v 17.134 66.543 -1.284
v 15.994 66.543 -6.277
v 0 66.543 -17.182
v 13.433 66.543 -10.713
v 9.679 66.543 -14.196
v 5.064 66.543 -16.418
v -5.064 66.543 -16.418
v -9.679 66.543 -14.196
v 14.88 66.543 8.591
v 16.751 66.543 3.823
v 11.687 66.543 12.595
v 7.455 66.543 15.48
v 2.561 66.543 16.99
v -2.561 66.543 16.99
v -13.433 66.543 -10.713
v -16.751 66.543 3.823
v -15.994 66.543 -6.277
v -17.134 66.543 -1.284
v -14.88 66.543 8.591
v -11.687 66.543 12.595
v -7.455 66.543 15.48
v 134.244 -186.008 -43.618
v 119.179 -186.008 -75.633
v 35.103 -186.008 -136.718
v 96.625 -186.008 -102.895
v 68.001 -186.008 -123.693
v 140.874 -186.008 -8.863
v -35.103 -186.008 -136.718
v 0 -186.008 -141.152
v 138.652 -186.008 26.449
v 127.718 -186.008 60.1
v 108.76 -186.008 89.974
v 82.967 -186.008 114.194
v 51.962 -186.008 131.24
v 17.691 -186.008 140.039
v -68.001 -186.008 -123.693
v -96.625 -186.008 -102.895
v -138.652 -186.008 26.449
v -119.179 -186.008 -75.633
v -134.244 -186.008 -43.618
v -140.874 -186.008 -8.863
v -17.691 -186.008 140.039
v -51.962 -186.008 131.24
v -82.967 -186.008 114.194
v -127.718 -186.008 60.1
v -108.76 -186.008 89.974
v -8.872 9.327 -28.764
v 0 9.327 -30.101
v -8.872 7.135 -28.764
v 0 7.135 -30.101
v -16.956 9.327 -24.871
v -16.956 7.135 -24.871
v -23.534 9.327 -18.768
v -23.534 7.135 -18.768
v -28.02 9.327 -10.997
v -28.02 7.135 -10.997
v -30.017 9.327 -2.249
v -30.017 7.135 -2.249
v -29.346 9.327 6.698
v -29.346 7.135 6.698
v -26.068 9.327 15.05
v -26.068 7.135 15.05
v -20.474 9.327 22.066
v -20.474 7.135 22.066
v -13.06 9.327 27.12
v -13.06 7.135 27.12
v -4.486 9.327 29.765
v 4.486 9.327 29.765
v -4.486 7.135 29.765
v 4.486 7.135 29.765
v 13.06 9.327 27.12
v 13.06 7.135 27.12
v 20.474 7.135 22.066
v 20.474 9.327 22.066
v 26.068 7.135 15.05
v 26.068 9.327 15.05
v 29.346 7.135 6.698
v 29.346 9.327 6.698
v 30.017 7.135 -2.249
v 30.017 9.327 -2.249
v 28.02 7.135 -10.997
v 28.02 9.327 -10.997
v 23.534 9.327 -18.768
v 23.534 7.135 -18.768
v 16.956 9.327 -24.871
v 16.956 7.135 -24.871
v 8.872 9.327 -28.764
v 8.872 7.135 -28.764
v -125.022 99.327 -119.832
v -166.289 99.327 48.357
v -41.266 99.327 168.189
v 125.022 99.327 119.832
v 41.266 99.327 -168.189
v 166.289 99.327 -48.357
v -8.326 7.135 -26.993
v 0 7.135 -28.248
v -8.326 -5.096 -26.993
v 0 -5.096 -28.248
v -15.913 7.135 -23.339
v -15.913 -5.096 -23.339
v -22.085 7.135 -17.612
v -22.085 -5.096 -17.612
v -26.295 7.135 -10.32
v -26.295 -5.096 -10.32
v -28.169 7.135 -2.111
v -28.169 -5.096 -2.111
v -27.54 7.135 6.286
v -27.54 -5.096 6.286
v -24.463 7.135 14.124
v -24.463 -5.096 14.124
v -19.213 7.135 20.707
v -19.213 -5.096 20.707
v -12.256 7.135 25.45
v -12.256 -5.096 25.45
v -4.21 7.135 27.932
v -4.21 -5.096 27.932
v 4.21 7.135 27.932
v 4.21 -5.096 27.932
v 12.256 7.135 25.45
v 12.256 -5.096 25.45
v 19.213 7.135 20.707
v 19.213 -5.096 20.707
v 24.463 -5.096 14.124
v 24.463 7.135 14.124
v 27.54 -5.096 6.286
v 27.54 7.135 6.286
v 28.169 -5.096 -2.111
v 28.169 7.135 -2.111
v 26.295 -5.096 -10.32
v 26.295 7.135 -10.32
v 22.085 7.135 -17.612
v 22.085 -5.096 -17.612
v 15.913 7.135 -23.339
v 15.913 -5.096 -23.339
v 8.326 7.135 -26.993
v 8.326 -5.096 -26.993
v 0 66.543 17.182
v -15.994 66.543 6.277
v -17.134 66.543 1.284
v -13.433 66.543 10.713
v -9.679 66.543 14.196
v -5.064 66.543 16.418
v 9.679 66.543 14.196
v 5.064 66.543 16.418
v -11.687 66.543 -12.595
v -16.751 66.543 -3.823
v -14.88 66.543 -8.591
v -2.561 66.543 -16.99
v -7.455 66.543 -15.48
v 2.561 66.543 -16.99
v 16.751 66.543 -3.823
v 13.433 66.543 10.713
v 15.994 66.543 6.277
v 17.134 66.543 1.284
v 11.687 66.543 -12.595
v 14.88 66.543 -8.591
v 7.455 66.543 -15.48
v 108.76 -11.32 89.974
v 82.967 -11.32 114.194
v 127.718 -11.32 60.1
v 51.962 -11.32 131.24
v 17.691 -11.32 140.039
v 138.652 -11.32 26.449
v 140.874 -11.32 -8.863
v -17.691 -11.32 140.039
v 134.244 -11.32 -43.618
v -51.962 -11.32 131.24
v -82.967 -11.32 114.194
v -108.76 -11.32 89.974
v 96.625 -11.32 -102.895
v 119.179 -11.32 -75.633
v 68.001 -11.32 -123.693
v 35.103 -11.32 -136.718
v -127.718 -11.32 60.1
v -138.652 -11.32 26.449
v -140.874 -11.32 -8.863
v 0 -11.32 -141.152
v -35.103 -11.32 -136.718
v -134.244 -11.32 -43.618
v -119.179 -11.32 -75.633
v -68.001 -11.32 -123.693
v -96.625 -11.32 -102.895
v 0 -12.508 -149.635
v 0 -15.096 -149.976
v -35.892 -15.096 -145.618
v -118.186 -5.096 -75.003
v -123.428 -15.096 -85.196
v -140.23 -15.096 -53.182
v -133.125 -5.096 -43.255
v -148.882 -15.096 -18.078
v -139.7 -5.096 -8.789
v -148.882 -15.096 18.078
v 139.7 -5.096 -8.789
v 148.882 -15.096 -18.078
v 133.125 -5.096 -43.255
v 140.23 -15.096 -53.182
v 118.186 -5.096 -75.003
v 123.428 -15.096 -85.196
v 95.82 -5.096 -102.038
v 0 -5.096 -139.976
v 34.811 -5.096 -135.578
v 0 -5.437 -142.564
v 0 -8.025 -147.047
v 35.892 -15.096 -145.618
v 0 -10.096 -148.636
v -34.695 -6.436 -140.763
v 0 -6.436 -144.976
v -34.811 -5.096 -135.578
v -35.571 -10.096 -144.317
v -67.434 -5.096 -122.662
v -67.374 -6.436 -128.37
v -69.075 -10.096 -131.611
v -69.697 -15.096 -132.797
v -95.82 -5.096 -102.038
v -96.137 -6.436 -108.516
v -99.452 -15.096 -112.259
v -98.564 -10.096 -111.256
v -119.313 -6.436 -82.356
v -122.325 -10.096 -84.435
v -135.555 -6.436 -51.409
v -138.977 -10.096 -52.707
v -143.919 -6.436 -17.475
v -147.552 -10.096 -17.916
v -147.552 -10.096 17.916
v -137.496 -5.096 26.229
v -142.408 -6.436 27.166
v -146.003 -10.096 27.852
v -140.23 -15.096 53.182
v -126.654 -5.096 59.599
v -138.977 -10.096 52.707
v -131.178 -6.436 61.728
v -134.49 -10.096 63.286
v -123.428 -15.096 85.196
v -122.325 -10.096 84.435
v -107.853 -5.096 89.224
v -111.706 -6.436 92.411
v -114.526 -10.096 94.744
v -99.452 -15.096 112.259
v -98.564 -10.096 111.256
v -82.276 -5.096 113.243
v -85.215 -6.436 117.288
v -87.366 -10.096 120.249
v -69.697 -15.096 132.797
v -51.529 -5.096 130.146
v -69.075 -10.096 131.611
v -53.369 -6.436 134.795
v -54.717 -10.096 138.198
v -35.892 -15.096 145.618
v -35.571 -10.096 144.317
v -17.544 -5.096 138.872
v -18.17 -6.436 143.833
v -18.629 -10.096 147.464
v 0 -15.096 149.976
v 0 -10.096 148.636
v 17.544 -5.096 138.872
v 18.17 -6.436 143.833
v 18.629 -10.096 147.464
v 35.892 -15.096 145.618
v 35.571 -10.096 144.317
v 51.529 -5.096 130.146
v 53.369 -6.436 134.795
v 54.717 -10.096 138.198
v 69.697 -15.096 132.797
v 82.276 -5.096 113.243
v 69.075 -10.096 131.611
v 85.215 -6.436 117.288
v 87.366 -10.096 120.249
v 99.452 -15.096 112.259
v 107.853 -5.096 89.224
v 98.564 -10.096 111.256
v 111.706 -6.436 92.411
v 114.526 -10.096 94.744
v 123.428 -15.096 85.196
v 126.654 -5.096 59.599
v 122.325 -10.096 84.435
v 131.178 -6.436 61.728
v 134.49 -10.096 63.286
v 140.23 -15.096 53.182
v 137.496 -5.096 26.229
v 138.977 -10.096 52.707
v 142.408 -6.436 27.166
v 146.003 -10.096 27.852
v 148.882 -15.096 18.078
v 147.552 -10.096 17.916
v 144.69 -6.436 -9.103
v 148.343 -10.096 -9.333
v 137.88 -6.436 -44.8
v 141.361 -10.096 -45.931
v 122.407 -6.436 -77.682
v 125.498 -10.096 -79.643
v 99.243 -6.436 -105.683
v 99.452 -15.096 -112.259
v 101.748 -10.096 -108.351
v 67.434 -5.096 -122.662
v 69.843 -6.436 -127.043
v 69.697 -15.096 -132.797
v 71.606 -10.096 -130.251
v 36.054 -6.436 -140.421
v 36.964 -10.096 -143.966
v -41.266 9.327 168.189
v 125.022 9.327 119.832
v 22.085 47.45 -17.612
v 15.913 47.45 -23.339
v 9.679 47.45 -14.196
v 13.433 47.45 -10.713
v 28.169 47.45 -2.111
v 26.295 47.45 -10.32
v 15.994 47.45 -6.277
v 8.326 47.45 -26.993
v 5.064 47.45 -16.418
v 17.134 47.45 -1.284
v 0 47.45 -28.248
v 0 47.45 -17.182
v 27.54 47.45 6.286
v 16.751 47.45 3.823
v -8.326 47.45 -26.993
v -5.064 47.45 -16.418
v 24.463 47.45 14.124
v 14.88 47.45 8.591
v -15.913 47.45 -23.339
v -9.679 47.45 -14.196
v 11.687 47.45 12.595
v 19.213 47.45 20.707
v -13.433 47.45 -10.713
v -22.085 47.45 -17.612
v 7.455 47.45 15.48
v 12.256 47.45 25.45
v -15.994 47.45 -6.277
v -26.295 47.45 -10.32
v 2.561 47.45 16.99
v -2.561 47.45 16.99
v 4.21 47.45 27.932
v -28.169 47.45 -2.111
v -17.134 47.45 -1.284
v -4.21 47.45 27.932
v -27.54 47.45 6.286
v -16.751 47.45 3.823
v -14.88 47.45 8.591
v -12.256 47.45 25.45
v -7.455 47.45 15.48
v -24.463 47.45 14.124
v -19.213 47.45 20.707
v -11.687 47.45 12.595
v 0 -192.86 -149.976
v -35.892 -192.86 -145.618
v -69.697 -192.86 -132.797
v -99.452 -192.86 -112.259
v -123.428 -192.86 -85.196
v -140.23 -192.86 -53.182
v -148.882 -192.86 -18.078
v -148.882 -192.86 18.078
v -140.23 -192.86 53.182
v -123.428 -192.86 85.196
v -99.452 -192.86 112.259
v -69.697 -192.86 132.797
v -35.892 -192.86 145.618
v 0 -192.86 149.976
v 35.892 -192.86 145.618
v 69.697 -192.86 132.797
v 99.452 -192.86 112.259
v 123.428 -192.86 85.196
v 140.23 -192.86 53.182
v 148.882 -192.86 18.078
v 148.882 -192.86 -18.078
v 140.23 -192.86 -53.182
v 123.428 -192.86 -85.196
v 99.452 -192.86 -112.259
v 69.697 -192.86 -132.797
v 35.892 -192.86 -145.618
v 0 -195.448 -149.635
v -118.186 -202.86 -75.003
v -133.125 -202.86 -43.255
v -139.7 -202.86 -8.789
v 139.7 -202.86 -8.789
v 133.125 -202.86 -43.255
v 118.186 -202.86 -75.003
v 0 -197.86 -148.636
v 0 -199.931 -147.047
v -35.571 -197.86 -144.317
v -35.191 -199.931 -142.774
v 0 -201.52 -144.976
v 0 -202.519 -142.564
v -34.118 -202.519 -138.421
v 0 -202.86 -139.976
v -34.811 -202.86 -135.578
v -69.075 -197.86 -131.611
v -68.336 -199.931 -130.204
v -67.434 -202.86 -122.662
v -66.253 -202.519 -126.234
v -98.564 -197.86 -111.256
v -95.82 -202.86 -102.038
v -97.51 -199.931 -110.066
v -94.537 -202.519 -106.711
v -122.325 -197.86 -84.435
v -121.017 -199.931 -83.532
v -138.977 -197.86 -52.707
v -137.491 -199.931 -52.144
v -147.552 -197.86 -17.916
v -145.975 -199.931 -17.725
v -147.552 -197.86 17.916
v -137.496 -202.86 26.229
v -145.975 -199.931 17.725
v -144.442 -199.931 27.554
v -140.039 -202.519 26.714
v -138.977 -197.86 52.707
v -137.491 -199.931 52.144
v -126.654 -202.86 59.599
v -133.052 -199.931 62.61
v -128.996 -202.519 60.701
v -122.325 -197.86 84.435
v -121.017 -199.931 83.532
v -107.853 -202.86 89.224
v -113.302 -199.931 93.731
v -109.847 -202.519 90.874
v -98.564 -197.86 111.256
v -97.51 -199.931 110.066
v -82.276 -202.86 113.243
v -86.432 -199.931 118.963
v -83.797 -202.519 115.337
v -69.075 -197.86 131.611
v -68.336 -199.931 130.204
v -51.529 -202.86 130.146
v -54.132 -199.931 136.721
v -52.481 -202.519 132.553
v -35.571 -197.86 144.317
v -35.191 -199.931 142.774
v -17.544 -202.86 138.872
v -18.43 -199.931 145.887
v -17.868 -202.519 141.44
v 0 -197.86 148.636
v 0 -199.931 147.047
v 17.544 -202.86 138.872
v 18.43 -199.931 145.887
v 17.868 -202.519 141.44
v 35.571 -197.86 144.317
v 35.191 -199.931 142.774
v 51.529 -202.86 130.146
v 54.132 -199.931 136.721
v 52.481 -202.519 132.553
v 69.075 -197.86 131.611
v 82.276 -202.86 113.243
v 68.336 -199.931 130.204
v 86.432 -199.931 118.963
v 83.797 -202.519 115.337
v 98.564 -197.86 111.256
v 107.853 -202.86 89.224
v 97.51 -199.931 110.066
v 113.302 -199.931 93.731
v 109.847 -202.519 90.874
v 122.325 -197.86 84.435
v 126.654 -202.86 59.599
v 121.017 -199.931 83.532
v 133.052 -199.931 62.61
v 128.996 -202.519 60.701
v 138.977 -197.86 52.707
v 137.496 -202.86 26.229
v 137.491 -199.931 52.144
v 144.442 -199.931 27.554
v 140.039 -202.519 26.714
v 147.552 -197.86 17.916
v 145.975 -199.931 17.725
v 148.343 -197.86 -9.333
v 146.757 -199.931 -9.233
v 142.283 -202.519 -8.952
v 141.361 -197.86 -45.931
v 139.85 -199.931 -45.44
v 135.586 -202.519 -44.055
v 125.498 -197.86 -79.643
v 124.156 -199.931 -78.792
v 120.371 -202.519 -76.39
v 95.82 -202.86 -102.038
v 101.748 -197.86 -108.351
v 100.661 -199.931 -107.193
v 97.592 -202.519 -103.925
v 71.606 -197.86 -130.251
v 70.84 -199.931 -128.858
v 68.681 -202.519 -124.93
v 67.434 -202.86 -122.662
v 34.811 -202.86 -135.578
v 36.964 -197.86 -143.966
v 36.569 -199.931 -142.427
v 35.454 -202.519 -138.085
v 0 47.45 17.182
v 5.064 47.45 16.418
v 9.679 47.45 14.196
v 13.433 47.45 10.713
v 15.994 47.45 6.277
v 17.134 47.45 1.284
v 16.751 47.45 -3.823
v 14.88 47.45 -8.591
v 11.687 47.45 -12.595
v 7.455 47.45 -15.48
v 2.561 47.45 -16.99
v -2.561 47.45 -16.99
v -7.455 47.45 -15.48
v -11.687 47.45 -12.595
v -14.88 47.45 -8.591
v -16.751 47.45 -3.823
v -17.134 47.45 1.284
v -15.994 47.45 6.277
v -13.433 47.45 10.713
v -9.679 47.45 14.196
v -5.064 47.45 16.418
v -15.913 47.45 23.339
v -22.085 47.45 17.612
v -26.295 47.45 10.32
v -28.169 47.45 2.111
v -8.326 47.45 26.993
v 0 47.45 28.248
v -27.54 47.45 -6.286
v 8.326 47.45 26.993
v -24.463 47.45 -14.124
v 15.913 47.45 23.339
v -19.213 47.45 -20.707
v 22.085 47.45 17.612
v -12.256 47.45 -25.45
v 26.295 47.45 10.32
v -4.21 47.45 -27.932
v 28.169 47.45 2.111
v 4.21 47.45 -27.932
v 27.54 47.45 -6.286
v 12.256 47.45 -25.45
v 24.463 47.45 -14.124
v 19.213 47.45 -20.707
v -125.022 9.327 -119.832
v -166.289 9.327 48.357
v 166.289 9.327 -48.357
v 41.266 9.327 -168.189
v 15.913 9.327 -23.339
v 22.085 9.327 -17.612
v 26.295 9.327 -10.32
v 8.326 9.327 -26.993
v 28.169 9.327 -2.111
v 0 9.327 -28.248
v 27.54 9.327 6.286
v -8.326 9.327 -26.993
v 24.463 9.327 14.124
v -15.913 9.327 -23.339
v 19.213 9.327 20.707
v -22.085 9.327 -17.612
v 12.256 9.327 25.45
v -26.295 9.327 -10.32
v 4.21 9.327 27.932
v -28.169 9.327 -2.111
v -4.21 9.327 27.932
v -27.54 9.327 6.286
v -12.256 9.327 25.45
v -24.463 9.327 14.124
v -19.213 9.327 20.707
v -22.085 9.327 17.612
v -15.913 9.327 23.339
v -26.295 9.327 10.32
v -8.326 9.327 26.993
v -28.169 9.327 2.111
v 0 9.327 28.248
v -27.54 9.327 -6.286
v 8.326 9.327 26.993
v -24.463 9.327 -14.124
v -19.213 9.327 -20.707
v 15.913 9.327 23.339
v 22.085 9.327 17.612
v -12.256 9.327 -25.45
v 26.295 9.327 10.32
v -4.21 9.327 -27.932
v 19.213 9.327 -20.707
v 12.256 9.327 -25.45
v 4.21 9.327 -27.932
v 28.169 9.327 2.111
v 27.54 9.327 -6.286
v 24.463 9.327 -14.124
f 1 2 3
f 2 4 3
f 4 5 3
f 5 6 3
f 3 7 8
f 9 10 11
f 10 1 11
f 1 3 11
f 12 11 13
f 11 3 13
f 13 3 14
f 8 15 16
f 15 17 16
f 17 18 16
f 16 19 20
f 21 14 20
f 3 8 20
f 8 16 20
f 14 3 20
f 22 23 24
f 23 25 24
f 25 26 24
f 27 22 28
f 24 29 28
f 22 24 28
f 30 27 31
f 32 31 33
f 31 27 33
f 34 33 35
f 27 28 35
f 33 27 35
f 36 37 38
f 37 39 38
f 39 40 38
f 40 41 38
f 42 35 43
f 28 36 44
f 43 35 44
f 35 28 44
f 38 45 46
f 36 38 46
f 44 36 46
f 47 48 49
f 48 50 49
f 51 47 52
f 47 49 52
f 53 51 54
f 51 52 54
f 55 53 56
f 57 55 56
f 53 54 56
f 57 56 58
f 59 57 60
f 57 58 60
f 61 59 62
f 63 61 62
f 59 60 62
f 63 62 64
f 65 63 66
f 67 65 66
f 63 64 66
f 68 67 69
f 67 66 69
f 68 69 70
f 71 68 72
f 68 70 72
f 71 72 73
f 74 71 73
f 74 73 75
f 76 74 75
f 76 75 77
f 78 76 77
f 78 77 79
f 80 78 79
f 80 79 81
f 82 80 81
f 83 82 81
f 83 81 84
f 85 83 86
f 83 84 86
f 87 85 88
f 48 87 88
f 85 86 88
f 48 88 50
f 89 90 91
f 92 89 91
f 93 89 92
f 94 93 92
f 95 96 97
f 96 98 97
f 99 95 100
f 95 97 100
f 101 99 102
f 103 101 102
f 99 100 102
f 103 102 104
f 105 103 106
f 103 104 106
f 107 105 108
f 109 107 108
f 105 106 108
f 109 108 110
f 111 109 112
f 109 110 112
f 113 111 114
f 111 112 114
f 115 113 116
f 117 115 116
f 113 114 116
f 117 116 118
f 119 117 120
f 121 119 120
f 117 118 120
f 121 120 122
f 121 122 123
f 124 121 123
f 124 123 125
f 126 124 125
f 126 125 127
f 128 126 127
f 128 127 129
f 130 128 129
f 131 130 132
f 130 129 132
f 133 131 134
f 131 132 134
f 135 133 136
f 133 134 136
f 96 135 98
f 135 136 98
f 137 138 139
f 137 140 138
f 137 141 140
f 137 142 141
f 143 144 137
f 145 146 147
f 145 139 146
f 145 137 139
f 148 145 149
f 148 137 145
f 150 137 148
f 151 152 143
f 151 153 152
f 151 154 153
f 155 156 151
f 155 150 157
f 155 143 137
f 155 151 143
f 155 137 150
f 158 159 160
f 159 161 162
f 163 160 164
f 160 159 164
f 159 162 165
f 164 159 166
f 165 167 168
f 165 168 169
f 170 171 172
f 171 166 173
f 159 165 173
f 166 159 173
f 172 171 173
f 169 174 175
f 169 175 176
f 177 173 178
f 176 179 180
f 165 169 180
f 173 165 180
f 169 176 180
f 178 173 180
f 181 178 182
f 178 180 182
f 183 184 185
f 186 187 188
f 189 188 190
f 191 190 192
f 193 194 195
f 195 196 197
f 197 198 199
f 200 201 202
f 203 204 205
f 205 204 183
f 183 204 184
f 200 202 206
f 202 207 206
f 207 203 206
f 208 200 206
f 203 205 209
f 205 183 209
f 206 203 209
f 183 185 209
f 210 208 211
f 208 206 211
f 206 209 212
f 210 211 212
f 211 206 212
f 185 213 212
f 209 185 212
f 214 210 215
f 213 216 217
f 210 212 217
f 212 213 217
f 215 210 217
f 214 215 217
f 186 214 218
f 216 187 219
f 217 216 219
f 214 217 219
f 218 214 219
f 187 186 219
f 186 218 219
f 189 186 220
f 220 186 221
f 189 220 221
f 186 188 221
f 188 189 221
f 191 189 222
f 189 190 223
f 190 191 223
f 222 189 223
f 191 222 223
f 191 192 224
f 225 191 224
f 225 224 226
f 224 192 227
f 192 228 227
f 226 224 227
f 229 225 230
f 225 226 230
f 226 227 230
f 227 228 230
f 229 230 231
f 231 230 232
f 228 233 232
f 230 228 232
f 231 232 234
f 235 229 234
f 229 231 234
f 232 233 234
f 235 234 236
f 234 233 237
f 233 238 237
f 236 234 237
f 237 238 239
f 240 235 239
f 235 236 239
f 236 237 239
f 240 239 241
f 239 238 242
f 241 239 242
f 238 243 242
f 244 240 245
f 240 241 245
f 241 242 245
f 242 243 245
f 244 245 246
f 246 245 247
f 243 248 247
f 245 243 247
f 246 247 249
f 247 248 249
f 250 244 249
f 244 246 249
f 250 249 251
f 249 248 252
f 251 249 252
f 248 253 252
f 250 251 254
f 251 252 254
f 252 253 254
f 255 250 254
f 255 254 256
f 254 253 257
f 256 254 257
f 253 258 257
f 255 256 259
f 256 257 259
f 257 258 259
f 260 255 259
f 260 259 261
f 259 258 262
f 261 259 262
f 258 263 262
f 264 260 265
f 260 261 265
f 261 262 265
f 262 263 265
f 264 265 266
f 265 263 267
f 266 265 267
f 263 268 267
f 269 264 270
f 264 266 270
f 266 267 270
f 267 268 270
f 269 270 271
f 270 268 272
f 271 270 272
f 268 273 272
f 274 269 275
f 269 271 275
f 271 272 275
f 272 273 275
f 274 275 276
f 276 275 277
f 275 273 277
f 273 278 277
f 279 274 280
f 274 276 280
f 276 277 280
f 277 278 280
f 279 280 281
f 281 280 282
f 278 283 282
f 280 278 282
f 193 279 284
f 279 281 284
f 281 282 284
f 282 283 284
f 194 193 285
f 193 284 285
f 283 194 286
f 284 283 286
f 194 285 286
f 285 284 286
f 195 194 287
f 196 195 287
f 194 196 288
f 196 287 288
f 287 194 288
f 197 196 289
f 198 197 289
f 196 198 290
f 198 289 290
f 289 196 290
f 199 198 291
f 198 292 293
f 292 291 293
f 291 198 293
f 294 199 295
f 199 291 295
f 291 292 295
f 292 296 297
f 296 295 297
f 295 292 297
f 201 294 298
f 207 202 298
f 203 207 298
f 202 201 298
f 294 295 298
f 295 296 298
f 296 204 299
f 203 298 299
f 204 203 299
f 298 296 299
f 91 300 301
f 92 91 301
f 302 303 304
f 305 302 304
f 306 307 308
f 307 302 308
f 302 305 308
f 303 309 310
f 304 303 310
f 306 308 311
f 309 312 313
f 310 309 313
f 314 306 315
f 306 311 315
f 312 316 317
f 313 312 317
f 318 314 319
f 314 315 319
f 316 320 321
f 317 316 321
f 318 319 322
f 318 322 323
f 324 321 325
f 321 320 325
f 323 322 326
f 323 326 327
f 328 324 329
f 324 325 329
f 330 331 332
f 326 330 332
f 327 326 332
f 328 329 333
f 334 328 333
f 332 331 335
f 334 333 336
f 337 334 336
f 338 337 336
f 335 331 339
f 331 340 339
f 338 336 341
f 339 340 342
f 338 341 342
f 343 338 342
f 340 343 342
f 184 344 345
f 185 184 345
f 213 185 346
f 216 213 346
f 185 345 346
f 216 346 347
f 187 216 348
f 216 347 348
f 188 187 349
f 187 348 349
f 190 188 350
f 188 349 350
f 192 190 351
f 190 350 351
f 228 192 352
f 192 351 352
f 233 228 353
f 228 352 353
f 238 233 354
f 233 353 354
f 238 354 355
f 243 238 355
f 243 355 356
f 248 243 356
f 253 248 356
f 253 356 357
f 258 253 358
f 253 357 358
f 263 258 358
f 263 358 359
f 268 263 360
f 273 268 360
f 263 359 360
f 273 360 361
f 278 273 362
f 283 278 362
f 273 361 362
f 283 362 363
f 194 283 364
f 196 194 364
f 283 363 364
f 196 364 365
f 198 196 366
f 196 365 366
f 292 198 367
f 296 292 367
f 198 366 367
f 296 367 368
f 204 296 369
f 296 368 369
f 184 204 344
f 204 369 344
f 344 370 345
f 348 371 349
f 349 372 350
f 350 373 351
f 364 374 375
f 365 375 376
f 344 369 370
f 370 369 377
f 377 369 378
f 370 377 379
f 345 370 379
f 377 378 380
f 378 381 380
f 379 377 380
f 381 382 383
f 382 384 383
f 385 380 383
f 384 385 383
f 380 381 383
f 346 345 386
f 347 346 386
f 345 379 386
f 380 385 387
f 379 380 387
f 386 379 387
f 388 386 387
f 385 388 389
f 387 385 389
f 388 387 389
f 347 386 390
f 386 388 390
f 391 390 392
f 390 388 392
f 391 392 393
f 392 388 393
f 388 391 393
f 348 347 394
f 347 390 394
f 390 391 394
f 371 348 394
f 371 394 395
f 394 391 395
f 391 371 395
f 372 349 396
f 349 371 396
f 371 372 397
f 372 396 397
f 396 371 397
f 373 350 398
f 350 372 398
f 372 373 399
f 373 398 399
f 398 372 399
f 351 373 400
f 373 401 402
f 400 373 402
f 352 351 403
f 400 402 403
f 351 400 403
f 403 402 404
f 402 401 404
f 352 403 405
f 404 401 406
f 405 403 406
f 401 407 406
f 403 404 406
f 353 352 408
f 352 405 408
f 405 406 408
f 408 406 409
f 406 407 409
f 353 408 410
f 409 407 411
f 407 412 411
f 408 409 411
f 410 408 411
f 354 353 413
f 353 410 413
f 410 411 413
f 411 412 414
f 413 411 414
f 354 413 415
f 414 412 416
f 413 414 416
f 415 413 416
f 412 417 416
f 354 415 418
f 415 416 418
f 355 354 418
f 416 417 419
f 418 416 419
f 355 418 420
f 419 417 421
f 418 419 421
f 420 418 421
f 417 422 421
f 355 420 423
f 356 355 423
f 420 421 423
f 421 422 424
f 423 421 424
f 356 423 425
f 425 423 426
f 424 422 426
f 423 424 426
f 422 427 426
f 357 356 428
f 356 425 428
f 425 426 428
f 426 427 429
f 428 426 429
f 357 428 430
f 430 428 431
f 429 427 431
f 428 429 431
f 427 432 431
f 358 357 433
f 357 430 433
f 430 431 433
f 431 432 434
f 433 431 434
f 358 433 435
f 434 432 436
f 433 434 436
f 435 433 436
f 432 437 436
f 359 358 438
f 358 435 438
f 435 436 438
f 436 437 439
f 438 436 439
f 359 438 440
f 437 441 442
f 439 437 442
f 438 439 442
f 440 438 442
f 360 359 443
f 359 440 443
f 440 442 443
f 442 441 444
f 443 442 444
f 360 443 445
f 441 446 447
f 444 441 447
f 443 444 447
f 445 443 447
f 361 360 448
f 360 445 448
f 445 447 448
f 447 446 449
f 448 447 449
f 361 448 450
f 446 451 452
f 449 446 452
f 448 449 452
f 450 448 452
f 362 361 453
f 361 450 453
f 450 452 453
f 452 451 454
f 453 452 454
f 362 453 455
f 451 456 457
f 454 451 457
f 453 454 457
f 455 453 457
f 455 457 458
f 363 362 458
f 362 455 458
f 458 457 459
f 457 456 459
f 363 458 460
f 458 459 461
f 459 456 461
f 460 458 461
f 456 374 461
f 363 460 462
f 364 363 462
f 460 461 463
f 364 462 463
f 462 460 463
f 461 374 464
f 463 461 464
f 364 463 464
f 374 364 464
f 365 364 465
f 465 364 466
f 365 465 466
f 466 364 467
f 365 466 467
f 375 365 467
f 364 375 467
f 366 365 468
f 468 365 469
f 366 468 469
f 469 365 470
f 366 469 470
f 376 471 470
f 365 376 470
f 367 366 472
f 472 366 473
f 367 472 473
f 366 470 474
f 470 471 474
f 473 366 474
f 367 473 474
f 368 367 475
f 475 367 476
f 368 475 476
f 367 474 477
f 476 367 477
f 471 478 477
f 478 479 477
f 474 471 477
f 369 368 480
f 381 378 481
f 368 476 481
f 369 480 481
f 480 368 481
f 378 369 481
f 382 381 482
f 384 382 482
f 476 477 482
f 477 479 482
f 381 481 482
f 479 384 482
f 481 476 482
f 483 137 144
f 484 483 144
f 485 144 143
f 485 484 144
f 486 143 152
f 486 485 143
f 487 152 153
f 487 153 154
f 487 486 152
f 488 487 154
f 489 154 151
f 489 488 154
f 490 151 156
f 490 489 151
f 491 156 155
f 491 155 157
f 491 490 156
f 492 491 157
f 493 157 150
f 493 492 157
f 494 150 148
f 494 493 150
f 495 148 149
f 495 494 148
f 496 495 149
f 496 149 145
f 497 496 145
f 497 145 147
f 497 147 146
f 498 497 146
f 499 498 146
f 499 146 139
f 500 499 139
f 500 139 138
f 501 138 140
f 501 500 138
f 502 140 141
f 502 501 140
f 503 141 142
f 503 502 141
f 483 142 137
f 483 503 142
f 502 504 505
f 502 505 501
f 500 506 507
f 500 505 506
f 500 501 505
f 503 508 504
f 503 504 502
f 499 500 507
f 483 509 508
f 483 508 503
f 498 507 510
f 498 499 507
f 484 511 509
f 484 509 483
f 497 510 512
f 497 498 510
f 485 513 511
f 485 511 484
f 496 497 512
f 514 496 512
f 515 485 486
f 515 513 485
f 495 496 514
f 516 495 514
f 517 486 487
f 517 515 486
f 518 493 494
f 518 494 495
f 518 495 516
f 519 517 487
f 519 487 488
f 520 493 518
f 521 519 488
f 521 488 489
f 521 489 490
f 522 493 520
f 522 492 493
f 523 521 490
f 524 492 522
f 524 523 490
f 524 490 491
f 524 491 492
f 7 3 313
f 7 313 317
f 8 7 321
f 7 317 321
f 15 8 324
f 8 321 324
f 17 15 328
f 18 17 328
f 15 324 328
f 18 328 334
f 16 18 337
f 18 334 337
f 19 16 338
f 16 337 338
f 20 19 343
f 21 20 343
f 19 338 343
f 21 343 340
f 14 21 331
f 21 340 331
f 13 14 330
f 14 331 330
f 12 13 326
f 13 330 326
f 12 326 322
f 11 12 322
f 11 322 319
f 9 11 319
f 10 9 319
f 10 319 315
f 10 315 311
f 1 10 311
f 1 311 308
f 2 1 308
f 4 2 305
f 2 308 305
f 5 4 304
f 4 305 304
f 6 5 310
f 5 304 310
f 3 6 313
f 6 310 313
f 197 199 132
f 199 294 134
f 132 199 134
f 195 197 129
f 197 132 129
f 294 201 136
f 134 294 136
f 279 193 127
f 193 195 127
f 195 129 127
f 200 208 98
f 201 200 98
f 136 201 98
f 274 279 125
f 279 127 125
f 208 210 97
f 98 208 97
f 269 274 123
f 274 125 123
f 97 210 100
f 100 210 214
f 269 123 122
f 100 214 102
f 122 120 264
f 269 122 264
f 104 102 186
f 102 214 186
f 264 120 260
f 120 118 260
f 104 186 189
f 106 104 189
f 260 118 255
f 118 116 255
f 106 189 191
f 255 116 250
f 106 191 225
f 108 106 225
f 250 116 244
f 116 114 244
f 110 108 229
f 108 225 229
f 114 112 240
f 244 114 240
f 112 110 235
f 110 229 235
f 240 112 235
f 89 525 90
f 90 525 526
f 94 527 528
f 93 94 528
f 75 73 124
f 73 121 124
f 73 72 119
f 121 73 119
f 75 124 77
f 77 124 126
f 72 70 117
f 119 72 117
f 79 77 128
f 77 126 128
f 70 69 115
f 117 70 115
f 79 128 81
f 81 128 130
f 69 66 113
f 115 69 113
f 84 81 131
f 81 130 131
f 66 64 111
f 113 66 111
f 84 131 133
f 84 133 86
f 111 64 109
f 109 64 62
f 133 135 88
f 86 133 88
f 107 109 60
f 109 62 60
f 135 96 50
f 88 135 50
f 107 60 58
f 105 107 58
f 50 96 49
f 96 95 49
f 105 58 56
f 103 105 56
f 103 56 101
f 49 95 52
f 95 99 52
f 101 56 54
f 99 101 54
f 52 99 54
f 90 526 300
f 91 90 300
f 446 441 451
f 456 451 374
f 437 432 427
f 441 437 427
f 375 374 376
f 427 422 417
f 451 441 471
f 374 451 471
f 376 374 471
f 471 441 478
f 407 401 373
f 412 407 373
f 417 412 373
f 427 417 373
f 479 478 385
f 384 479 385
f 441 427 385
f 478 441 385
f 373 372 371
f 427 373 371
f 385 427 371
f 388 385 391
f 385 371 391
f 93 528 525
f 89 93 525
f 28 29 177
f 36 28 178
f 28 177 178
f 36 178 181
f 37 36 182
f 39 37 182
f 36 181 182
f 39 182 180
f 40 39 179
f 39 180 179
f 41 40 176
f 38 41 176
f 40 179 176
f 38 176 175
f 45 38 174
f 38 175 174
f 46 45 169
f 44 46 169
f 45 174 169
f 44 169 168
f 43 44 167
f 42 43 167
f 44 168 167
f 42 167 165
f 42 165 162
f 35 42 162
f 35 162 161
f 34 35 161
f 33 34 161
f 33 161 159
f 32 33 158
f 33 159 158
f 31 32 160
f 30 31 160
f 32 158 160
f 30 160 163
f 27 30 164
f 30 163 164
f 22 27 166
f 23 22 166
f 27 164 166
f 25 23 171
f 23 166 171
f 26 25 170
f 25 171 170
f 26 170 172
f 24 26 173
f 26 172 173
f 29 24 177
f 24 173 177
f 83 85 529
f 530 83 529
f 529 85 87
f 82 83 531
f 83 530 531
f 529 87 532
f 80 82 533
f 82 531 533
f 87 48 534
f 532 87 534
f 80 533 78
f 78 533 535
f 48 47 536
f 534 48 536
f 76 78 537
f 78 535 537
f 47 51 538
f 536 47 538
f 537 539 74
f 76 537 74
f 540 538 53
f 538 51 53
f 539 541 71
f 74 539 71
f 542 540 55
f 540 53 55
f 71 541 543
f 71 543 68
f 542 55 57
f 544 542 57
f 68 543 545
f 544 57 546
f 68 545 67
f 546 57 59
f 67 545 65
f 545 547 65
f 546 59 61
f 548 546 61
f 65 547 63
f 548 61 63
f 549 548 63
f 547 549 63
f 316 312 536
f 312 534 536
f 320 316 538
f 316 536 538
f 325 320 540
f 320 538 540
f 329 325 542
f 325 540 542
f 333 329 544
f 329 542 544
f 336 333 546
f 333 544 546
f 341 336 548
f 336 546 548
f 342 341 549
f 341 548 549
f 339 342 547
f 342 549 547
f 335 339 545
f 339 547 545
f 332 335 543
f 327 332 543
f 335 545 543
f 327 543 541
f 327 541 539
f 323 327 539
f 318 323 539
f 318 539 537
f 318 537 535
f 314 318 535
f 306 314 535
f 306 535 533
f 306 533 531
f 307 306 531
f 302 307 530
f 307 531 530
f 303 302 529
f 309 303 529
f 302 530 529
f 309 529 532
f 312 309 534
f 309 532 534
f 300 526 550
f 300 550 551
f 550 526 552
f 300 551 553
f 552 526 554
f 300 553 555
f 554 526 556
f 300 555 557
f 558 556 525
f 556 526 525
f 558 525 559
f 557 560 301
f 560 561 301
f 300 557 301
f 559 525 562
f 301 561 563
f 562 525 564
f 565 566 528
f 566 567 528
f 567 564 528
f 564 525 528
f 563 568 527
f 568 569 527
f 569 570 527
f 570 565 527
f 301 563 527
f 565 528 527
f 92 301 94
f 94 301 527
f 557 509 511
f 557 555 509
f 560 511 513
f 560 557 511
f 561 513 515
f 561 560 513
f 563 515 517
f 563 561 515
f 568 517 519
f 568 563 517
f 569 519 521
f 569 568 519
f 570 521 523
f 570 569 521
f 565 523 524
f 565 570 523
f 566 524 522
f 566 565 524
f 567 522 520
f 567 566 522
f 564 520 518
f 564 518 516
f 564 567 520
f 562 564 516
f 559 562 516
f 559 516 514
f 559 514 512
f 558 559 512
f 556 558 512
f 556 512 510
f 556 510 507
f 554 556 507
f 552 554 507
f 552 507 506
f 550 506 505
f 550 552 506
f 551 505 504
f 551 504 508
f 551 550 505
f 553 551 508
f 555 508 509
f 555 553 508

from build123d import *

# Parameters (mm, degrees)
FILLET_1_R      = 10
FILLET_2_R      = 10
EXTRUDE_1_DEPTH = 90


with BuildPart() as part:
    # Эскиз1 → Повернуть1 (revolve)
    with BuildSketch(Plane.XY):
        Polygon((0, 66.542681753), (17.181699008, 66.542681753), (17.181699008, 47.449620601), (28.247878031, 47.449620601), (28.247878031, 9.327244829), (30.100902096, 9.327244829), (30.100902096, 7.134773317), (28.247878031, 7.134773317), (28.247878031, -5.096266655), (149.975847277, -5.096266655), (149.975847277, -202.860033708), (0, -202.860033708), (0, -186.007813089), (141.152083847, -186.007813089), (141.152083847, -11.320160326), (0, -11.320160326), align=None)
    revolve(axis=Axis((0, -11.320160326, 0), (0, 1, 0)))

    # Скругление1
    fillet_1_edges = [part.edges().sort_by_distance(p)[0] for p in [
        (-149.975847277, -5.096266655, 0),
    ]]
    fillet(fillet_1_edges, radius=FILLET_1_R)

    # Скругление2
    fillet_2_edges = [part.edges().sort_by_distance(p)[0] for p in [
        (-149.975847277, -202.860033708, 0),
    ]]
    fillet(fillet_2_edges, radius=FILLET_2_R)


with BuildPart() as body_2:
    # Эскиз2 → Бобышка-Вытянуть1 (new body)
    with BuildSketch(Plane(origin=(0, 9.327244829, 0), x_dir=(1, 0, 0), z_dir=(0, 1, 0))):
        Polygon((-125.022494836, 119.832030249), (-166.288829801, -48.356641448), (-41.266334965, -168.188671697), (125.022494836, -119.832030249), (166.288829801, 48.356641448), (41.266334965, 168.188671697), align=None)
    extrude(amount=EXTRUDE_1_DEPTH)

    # Эскиз1<3> → Вырез-Повернуть1 (revolve, cut)
    with BuildSketch(Plane.XY):
        Polygon((0, 66.542681753), (17.181699008, 66.542681753), (17.181699008, 47.449620601), (28.247878031, 47.449620601), (28.247878031, 9.327244829), (30.100902096, 9.327244829), (30.100902096, 7.134773317), (28.247878031, 7.134773317), (28.247878031, -5.096266655), (149.975847277, -5.096266655), (149.975847277, -202.860033708), (0, -202.860033708), (0, -186.007813089), (141.152083847, -186.007813089), (141.152083847, -11.320160326), (0, -11.320160326), align=None)
    revolve(axis=Axis((0, -11.320160326, 0), (0, 1, 0)), mode=Mode.SUBTRACT)


solid = Compound([part.part, body_2.part])
